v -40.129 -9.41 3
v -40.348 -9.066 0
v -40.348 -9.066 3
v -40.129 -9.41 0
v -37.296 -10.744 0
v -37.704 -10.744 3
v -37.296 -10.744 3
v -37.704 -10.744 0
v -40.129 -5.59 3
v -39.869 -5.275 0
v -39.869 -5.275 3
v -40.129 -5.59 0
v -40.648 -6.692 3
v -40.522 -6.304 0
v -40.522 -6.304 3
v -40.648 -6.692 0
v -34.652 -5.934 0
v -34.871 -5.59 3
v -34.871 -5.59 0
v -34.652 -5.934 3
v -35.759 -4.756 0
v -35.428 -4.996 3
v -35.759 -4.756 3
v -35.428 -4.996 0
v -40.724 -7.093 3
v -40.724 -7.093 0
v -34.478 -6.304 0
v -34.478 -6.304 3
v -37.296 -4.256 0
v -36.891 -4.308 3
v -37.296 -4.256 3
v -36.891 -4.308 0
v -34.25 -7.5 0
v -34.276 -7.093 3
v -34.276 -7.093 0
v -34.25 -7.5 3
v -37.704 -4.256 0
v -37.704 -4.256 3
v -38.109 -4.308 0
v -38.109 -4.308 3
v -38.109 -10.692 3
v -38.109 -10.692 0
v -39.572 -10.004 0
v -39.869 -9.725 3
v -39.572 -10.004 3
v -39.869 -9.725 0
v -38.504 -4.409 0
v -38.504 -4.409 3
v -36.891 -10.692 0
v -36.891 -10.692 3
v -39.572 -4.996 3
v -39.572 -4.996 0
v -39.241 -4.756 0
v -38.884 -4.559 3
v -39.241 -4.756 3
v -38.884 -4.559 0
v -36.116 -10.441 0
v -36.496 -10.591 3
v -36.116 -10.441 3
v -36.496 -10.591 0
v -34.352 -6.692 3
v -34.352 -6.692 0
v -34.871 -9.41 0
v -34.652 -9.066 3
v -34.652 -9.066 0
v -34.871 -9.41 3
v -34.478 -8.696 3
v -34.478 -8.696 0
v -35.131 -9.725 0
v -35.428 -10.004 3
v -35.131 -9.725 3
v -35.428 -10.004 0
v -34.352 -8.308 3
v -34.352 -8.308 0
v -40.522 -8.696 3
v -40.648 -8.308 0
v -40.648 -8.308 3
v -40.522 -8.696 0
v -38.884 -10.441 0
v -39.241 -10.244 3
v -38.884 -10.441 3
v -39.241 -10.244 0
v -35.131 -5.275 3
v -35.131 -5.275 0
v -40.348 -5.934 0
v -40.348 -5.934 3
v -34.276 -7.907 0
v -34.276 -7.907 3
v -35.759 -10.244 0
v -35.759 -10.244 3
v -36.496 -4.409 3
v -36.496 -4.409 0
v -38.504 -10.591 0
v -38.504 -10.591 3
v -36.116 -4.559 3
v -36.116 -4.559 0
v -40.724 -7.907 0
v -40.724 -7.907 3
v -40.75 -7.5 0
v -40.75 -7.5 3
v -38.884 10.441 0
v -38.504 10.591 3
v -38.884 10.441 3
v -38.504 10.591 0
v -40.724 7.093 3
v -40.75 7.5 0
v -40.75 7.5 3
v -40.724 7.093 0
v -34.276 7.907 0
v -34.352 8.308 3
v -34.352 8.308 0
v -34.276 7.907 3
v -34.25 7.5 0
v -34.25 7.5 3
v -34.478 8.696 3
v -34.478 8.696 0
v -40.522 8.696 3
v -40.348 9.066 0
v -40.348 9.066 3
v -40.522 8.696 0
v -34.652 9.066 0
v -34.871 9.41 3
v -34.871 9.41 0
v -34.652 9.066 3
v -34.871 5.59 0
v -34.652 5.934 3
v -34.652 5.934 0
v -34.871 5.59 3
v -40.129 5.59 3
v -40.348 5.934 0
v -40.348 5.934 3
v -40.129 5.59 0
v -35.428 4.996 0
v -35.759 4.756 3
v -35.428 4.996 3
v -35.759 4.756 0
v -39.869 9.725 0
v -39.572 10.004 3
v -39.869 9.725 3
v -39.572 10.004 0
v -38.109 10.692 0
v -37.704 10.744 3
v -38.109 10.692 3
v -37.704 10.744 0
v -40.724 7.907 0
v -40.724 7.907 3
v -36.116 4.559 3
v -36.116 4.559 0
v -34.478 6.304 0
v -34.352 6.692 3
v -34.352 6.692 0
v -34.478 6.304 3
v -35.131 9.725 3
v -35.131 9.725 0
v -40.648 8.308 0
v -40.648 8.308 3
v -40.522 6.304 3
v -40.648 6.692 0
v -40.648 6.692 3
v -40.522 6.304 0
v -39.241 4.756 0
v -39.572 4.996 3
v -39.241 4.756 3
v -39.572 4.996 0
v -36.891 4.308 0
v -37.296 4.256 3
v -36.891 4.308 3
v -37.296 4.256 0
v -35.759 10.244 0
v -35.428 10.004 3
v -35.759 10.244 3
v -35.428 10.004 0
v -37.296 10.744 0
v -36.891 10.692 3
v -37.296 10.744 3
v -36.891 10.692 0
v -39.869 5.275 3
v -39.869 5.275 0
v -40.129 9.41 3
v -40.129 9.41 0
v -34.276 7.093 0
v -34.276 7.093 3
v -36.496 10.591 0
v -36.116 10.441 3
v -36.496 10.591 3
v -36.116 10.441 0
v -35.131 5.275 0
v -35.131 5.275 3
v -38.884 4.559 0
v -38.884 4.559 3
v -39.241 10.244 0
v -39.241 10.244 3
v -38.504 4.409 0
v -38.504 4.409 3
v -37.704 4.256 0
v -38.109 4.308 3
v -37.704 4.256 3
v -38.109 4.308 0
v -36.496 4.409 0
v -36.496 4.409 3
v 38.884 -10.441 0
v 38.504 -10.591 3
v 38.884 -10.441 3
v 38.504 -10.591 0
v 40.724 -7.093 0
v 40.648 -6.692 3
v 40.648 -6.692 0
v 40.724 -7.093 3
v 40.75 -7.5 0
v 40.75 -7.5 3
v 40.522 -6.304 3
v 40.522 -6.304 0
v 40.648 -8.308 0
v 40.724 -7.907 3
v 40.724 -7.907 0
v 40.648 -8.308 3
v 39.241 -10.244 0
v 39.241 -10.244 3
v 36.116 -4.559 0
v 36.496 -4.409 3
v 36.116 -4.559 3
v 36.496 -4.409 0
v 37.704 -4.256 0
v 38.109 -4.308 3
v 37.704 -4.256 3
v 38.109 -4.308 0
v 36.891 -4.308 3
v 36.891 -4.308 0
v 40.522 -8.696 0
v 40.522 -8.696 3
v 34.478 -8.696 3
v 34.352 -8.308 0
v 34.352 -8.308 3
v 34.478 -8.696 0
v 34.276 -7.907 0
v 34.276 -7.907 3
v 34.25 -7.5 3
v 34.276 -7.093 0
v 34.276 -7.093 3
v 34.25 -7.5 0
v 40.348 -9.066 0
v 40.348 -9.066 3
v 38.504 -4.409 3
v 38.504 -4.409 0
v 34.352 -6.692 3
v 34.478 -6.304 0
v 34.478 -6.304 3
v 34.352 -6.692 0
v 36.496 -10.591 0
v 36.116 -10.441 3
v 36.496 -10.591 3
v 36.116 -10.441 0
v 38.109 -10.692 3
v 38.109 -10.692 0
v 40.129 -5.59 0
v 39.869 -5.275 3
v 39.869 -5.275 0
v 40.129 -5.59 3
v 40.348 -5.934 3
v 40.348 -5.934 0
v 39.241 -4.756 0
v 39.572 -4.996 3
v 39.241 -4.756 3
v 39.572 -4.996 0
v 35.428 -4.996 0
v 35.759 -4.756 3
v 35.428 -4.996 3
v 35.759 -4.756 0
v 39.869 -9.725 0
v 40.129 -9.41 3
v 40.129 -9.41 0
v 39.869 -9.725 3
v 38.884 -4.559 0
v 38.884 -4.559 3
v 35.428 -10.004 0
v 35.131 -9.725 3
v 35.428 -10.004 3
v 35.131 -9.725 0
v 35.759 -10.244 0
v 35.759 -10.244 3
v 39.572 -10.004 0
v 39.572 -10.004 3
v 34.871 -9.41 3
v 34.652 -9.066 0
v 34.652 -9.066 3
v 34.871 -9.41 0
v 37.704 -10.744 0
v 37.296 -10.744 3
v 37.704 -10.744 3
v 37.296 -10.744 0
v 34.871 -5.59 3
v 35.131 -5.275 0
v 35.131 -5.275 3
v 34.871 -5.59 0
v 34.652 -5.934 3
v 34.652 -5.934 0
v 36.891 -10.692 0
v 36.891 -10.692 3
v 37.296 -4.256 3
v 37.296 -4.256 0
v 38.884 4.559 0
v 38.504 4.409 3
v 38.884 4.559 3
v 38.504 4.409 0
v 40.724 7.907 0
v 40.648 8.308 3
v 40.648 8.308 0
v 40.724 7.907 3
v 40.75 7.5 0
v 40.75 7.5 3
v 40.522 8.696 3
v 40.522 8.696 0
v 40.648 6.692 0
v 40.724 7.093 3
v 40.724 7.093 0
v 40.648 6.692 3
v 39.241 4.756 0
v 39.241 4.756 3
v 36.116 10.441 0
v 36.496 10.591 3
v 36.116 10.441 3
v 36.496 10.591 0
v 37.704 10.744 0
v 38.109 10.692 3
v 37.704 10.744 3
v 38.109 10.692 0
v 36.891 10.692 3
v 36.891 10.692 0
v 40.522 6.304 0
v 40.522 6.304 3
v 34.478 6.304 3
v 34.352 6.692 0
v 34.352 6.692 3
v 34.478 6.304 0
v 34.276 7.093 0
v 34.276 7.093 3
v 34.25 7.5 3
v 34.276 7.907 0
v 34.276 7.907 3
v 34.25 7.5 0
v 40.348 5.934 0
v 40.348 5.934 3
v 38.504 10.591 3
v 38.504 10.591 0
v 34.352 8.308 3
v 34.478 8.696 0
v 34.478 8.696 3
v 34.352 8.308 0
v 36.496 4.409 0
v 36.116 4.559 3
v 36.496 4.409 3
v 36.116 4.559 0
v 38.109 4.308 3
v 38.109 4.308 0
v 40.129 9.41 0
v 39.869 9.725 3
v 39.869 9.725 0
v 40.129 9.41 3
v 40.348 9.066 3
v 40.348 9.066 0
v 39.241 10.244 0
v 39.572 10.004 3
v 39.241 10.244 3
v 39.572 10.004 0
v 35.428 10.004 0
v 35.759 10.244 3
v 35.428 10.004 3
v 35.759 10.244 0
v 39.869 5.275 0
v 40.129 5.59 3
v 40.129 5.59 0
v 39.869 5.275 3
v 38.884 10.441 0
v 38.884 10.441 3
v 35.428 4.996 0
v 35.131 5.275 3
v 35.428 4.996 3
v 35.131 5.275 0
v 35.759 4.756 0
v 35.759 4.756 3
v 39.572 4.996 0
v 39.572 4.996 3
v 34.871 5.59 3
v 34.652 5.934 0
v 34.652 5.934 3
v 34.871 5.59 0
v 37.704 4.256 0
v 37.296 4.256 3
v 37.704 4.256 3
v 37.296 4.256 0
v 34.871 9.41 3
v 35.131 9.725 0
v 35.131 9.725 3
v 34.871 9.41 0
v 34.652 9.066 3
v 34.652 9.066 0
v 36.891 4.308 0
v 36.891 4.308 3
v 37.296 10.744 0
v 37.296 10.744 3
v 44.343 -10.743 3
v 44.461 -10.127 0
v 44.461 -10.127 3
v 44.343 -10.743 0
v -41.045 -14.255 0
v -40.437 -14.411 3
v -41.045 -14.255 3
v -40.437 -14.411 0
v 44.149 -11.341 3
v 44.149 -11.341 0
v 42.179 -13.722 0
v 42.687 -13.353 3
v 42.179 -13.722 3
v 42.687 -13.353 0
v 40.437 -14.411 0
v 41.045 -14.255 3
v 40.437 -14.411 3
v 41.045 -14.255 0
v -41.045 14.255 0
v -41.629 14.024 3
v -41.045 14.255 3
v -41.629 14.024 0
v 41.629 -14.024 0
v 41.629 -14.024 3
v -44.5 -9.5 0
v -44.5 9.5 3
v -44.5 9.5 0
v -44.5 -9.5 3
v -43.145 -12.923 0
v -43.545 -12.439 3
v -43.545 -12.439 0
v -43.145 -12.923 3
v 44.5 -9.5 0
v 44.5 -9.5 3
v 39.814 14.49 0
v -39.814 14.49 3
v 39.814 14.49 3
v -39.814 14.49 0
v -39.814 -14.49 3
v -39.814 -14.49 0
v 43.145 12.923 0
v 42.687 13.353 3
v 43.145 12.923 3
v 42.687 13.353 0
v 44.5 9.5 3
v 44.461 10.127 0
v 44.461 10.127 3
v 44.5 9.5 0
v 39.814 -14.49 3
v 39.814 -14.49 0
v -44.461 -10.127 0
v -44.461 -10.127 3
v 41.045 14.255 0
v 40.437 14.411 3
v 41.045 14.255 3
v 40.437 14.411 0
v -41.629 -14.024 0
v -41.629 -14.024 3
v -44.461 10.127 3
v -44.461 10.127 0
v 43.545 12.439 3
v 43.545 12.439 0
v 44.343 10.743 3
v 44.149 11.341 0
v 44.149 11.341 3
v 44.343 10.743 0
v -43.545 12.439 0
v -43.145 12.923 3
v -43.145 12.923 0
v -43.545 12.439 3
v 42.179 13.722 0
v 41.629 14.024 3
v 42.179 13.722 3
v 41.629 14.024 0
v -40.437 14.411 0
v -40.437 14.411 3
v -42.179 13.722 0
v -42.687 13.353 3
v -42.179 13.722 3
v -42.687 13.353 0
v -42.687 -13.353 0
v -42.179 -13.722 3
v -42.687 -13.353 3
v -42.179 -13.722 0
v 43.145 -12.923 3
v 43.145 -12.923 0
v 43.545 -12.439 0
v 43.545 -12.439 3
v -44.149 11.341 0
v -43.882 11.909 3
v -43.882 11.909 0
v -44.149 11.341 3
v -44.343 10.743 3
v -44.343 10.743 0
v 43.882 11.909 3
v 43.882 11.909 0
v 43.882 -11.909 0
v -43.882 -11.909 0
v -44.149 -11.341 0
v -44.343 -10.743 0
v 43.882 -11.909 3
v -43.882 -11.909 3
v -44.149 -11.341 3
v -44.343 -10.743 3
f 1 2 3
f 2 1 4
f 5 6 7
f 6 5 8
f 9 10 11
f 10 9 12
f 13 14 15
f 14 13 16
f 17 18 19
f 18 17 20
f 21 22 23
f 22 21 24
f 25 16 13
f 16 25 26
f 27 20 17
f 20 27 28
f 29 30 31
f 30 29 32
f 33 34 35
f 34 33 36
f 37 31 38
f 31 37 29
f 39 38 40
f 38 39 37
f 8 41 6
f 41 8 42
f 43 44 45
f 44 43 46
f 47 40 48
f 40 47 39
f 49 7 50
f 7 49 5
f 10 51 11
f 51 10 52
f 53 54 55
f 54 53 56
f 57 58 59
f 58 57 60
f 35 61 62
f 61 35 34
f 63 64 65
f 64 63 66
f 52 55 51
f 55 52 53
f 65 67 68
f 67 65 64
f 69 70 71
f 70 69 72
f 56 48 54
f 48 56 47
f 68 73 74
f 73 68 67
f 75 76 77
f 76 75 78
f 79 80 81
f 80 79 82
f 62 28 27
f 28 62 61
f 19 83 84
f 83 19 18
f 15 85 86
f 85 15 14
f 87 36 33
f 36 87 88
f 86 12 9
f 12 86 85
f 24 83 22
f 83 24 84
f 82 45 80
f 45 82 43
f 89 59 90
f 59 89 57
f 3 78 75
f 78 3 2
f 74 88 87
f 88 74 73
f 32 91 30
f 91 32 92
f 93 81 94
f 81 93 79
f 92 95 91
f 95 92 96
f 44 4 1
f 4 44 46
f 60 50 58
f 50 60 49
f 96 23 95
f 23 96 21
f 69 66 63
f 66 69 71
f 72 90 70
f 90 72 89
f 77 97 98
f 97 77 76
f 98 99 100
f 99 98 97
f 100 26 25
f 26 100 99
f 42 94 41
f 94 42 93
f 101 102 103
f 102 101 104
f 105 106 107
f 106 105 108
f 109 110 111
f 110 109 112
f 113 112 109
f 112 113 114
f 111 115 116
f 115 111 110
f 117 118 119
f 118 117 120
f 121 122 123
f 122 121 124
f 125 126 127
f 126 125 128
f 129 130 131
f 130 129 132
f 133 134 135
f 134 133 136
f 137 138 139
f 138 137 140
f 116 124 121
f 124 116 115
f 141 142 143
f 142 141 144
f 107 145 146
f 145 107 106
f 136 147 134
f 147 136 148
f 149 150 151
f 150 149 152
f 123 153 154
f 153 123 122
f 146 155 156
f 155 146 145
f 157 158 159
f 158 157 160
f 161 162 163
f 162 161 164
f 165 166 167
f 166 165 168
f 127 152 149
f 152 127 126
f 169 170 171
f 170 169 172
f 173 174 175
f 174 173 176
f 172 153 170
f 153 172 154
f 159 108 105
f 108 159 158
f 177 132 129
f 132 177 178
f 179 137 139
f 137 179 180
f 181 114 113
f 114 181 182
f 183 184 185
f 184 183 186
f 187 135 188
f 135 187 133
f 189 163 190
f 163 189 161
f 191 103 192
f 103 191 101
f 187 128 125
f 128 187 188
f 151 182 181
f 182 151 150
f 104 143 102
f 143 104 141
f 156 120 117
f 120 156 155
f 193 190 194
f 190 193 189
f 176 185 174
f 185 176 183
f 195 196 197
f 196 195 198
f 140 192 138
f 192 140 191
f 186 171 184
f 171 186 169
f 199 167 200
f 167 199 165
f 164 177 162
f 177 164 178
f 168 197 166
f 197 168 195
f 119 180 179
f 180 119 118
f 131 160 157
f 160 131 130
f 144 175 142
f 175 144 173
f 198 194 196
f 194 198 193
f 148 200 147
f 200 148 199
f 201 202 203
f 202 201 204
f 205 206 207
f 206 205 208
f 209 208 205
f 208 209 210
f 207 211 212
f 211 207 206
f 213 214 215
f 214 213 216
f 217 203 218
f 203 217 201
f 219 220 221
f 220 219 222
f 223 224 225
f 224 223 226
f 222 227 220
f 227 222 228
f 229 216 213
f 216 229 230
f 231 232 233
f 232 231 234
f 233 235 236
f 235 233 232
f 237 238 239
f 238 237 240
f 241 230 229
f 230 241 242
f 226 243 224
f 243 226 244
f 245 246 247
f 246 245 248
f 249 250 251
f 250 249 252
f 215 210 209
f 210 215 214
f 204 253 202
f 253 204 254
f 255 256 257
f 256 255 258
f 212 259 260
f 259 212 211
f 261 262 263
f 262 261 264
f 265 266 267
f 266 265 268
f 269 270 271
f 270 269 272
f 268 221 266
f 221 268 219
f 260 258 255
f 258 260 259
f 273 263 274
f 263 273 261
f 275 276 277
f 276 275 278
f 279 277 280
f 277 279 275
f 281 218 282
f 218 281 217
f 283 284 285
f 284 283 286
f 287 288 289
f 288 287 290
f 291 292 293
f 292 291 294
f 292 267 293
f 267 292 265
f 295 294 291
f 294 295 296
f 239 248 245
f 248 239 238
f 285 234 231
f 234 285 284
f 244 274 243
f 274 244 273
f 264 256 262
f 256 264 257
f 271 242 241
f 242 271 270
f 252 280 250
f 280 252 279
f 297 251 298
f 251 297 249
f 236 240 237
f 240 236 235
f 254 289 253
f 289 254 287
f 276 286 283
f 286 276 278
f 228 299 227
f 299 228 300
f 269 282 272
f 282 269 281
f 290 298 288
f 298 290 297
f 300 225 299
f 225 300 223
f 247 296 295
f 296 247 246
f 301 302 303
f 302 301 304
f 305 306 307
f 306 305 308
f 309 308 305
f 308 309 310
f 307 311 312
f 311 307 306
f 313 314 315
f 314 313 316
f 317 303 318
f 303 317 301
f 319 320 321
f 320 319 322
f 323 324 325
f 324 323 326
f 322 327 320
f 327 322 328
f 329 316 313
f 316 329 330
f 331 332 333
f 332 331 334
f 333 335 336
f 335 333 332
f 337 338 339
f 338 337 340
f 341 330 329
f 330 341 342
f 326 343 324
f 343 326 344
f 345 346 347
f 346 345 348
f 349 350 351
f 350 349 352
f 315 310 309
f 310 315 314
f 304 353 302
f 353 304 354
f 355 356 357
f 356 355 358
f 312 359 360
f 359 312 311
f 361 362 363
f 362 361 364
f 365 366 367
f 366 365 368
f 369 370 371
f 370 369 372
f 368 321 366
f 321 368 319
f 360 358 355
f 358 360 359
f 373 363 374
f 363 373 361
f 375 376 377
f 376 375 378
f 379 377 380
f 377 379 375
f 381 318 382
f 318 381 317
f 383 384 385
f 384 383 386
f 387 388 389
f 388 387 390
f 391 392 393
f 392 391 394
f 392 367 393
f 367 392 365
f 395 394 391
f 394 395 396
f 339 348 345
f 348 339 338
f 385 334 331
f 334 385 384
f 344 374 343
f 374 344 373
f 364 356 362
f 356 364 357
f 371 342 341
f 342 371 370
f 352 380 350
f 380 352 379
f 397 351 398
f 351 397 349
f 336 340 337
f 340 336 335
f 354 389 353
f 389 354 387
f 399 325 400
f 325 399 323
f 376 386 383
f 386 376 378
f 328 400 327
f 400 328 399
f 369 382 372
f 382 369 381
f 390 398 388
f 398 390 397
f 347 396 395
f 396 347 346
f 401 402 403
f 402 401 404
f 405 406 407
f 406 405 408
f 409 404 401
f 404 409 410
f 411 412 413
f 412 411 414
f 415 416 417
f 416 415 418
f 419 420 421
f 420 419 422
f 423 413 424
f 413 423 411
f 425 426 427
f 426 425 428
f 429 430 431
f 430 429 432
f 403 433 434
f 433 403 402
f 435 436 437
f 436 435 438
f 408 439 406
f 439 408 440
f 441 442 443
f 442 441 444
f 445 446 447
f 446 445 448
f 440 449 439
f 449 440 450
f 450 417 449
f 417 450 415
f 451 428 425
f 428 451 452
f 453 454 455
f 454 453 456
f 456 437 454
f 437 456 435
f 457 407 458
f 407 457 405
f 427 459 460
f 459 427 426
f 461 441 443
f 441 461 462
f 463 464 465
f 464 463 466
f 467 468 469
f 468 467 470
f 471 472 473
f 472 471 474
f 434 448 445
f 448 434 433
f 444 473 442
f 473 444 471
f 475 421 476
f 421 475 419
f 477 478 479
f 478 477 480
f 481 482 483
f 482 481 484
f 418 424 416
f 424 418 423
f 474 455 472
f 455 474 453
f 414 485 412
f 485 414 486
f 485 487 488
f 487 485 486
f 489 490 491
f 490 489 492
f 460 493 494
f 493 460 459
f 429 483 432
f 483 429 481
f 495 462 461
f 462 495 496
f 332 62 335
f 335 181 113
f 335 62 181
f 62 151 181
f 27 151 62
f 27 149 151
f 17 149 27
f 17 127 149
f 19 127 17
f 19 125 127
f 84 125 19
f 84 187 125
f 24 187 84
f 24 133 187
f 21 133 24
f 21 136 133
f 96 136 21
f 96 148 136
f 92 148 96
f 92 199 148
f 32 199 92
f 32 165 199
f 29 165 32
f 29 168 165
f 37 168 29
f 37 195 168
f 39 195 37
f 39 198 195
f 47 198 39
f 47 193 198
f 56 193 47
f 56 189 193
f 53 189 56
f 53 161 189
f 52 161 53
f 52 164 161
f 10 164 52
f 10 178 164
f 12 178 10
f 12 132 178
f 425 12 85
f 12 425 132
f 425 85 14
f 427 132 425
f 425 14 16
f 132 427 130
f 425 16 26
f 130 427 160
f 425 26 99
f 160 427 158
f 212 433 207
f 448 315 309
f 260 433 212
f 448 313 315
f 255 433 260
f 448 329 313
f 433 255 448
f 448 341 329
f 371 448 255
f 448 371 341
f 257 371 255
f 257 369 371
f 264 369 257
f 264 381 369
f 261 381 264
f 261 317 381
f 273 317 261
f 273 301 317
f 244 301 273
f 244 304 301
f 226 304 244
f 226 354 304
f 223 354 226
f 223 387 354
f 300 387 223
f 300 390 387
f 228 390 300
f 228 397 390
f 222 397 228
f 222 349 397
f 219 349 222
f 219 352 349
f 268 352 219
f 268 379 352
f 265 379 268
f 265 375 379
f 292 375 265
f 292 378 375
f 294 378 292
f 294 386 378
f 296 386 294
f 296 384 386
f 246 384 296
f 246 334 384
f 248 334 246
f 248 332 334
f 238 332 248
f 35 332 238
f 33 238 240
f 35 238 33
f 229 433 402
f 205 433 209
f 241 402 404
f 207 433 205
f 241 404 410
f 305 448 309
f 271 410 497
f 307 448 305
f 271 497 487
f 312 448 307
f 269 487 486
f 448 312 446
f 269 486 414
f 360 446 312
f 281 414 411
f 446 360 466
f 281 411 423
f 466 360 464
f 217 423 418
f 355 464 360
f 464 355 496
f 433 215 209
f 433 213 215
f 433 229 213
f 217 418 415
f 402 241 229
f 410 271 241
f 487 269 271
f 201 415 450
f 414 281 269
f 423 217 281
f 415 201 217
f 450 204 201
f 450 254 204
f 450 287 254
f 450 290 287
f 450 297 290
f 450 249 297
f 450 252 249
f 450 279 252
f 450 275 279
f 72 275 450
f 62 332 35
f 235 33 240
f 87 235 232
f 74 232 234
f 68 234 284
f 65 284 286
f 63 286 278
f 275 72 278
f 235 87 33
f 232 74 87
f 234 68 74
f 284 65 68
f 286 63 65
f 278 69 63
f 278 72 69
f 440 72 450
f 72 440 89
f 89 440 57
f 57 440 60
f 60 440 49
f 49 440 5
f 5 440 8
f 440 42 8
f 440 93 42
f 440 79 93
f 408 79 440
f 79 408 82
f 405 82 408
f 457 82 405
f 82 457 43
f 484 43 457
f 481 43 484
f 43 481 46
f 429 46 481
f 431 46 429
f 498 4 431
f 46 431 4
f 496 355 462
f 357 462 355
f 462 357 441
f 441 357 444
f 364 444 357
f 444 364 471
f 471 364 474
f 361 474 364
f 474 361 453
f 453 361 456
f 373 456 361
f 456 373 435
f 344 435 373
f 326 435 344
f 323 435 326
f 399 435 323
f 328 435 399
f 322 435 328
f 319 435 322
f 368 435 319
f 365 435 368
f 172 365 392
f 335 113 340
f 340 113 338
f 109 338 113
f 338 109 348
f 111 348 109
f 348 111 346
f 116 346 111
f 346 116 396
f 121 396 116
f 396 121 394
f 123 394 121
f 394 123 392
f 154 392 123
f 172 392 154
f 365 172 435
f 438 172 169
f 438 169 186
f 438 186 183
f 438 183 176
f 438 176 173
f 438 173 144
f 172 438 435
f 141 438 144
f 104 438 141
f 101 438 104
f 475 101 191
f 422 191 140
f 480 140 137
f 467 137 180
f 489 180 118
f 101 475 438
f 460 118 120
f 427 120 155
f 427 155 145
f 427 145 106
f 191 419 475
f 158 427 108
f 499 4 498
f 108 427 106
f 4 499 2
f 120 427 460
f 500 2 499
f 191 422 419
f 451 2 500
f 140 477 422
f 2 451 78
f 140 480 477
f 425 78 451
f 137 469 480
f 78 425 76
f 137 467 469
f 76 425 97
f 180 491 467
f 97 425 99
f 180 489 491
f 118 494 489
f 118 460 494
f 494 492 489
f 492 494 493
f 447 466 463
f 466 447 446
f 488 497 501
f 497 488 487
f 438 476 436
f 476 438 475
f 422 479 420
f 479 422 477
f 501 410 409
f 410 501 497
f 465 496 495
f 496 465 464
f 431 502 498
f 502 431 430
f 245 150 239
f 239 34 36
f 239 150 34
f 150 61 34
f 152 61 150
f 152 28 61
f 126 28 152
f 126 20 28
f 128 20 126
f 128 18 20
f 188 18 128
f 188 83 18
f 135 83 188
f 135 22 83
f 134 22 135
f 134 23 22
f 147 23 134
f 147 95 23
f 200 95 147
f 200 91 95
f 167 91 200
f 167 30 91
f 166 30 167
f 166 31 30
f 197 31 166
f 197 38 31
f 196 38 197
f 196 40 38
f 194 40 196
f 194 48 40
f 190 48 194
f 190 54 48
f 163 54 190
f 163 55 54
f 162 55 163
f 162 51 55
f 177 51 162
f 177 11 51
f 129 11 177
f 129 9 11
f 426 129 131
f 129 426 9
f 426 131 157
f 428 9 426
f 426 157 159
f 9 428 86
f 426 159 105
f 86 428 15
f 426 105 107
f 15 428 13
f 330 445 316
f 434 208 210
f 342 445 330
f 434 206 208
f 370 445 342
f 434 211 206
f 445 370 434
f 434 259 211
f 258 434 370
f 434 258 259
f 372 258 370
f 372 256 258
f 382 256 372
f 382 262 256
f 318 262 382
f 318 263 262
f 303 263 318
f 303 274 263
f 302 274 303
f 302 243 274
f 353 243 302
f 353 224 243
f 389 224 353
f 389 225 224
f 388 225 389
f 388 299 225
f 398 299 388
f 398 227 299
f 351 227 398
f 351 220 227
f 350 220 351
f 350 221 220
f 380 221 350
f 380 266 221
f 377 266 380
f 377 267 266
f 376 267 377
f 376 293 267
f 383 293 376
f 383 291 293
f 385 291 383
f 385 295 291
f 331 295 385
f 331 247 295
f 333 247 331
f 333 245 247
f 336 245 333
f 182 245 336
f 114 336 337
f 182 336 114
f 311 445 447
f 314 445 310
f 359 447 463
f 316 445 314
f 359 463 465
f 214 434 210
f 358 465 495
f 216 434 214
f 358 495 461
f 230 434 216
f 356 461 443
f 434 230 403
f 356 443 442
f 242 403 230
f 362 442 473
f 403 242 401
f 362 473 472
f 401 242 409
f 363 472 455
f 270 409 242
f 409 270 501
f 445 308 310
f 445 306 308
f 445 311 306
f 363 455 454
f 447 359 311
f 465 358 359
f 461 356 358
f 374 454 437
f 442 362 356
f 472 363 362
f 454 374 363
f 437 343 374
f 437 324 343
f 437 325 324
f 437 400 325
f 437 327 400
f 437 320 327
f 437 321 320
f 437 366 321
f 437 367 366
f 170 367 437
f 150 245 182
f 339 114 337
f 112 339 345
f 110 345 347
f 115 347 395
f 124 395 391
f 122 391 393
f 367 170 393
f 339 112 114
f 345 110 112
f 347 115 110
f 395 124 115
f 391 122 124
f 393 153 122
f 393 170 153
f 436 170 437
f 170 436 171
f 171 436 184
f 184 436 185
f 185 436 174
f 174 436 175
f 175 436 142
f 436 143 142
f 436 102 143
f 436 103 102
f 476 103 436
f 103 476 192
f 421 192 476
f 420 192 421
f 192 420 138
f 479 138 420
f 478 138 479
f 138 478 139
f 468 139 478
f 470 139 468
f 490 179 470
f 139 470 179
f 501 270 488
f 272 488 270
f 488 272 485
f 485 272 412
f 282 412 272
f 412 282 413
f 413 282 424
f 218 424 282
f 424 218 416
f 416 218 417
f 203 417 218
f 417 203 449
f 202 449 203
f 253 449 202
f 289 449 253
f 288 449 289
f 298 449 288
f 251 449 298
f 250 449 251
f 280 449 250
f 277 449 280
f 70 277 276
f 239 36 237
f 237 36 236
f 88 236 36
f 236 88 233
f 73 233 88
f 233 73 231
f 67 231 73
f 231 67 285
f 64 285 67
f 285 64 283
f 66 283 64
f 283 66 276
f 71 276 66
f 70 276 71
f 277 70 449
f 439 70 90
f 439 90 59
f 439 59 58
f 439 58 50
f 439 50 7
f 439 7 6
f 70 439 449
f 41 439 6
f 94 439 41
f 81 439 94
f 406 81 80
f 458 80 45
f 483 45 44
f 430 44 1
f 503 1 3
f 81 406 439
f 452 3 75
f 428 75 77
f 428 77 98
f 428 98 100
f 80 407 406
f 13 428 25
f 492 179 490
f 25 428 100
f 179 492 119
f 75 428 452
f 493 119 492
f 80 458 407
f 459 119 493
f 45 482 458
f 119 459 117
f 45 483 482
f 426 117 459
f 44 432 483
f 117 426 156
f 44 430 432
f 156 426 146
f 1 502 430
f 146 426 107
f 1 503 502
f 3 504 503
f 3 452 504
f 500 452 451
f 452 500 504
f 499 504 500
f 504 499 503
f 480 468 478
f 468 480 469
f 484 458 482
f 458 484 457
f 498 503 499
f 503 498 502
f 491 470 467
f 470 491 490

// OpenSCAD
$fn = 50;


difference() {
	union() {
		hull() {
			translate(v = [-39.5000000000, 9.5000000000, 0]) {
				cylinder(h = 3, r = 5);
			}
			translate(v = [39.5000000000, 9.5000000000, 0]) {
				cylinder(h = 3, r = 5);
			}
			translate(v = [-39.5000000000, -9.5000000000, 0]) {
				cylinder(h = 3, r = 5);
			}
			translate(v = [39.5000000000, -9.5000000000, 0]) {
				cylinder(h = 3, r = 5);
			}
		}
	}
	union() {
		translate(v = [-37.5000000000, -7.5000000000, -100.0000000000]) {
			cylinder(h = 200, r = 3.2500000000);
		}
		translate(v = [-37.5000000000, 7.5000000000, -100.0000000000]) {
			cylinder(h = 200, r = 3.2500000000);
		}
		translate(v = [37.5000000000, -7.5000000000, -100.0000000000]) {
			cylinder(h = 200, r = 3.2500000000);
		}
		translate(v = [37.5000000000, 7.5000000000, -100.0000000000]) {
			cylinder(h = 200, r = 3.2500000000);
		}
	}
}
